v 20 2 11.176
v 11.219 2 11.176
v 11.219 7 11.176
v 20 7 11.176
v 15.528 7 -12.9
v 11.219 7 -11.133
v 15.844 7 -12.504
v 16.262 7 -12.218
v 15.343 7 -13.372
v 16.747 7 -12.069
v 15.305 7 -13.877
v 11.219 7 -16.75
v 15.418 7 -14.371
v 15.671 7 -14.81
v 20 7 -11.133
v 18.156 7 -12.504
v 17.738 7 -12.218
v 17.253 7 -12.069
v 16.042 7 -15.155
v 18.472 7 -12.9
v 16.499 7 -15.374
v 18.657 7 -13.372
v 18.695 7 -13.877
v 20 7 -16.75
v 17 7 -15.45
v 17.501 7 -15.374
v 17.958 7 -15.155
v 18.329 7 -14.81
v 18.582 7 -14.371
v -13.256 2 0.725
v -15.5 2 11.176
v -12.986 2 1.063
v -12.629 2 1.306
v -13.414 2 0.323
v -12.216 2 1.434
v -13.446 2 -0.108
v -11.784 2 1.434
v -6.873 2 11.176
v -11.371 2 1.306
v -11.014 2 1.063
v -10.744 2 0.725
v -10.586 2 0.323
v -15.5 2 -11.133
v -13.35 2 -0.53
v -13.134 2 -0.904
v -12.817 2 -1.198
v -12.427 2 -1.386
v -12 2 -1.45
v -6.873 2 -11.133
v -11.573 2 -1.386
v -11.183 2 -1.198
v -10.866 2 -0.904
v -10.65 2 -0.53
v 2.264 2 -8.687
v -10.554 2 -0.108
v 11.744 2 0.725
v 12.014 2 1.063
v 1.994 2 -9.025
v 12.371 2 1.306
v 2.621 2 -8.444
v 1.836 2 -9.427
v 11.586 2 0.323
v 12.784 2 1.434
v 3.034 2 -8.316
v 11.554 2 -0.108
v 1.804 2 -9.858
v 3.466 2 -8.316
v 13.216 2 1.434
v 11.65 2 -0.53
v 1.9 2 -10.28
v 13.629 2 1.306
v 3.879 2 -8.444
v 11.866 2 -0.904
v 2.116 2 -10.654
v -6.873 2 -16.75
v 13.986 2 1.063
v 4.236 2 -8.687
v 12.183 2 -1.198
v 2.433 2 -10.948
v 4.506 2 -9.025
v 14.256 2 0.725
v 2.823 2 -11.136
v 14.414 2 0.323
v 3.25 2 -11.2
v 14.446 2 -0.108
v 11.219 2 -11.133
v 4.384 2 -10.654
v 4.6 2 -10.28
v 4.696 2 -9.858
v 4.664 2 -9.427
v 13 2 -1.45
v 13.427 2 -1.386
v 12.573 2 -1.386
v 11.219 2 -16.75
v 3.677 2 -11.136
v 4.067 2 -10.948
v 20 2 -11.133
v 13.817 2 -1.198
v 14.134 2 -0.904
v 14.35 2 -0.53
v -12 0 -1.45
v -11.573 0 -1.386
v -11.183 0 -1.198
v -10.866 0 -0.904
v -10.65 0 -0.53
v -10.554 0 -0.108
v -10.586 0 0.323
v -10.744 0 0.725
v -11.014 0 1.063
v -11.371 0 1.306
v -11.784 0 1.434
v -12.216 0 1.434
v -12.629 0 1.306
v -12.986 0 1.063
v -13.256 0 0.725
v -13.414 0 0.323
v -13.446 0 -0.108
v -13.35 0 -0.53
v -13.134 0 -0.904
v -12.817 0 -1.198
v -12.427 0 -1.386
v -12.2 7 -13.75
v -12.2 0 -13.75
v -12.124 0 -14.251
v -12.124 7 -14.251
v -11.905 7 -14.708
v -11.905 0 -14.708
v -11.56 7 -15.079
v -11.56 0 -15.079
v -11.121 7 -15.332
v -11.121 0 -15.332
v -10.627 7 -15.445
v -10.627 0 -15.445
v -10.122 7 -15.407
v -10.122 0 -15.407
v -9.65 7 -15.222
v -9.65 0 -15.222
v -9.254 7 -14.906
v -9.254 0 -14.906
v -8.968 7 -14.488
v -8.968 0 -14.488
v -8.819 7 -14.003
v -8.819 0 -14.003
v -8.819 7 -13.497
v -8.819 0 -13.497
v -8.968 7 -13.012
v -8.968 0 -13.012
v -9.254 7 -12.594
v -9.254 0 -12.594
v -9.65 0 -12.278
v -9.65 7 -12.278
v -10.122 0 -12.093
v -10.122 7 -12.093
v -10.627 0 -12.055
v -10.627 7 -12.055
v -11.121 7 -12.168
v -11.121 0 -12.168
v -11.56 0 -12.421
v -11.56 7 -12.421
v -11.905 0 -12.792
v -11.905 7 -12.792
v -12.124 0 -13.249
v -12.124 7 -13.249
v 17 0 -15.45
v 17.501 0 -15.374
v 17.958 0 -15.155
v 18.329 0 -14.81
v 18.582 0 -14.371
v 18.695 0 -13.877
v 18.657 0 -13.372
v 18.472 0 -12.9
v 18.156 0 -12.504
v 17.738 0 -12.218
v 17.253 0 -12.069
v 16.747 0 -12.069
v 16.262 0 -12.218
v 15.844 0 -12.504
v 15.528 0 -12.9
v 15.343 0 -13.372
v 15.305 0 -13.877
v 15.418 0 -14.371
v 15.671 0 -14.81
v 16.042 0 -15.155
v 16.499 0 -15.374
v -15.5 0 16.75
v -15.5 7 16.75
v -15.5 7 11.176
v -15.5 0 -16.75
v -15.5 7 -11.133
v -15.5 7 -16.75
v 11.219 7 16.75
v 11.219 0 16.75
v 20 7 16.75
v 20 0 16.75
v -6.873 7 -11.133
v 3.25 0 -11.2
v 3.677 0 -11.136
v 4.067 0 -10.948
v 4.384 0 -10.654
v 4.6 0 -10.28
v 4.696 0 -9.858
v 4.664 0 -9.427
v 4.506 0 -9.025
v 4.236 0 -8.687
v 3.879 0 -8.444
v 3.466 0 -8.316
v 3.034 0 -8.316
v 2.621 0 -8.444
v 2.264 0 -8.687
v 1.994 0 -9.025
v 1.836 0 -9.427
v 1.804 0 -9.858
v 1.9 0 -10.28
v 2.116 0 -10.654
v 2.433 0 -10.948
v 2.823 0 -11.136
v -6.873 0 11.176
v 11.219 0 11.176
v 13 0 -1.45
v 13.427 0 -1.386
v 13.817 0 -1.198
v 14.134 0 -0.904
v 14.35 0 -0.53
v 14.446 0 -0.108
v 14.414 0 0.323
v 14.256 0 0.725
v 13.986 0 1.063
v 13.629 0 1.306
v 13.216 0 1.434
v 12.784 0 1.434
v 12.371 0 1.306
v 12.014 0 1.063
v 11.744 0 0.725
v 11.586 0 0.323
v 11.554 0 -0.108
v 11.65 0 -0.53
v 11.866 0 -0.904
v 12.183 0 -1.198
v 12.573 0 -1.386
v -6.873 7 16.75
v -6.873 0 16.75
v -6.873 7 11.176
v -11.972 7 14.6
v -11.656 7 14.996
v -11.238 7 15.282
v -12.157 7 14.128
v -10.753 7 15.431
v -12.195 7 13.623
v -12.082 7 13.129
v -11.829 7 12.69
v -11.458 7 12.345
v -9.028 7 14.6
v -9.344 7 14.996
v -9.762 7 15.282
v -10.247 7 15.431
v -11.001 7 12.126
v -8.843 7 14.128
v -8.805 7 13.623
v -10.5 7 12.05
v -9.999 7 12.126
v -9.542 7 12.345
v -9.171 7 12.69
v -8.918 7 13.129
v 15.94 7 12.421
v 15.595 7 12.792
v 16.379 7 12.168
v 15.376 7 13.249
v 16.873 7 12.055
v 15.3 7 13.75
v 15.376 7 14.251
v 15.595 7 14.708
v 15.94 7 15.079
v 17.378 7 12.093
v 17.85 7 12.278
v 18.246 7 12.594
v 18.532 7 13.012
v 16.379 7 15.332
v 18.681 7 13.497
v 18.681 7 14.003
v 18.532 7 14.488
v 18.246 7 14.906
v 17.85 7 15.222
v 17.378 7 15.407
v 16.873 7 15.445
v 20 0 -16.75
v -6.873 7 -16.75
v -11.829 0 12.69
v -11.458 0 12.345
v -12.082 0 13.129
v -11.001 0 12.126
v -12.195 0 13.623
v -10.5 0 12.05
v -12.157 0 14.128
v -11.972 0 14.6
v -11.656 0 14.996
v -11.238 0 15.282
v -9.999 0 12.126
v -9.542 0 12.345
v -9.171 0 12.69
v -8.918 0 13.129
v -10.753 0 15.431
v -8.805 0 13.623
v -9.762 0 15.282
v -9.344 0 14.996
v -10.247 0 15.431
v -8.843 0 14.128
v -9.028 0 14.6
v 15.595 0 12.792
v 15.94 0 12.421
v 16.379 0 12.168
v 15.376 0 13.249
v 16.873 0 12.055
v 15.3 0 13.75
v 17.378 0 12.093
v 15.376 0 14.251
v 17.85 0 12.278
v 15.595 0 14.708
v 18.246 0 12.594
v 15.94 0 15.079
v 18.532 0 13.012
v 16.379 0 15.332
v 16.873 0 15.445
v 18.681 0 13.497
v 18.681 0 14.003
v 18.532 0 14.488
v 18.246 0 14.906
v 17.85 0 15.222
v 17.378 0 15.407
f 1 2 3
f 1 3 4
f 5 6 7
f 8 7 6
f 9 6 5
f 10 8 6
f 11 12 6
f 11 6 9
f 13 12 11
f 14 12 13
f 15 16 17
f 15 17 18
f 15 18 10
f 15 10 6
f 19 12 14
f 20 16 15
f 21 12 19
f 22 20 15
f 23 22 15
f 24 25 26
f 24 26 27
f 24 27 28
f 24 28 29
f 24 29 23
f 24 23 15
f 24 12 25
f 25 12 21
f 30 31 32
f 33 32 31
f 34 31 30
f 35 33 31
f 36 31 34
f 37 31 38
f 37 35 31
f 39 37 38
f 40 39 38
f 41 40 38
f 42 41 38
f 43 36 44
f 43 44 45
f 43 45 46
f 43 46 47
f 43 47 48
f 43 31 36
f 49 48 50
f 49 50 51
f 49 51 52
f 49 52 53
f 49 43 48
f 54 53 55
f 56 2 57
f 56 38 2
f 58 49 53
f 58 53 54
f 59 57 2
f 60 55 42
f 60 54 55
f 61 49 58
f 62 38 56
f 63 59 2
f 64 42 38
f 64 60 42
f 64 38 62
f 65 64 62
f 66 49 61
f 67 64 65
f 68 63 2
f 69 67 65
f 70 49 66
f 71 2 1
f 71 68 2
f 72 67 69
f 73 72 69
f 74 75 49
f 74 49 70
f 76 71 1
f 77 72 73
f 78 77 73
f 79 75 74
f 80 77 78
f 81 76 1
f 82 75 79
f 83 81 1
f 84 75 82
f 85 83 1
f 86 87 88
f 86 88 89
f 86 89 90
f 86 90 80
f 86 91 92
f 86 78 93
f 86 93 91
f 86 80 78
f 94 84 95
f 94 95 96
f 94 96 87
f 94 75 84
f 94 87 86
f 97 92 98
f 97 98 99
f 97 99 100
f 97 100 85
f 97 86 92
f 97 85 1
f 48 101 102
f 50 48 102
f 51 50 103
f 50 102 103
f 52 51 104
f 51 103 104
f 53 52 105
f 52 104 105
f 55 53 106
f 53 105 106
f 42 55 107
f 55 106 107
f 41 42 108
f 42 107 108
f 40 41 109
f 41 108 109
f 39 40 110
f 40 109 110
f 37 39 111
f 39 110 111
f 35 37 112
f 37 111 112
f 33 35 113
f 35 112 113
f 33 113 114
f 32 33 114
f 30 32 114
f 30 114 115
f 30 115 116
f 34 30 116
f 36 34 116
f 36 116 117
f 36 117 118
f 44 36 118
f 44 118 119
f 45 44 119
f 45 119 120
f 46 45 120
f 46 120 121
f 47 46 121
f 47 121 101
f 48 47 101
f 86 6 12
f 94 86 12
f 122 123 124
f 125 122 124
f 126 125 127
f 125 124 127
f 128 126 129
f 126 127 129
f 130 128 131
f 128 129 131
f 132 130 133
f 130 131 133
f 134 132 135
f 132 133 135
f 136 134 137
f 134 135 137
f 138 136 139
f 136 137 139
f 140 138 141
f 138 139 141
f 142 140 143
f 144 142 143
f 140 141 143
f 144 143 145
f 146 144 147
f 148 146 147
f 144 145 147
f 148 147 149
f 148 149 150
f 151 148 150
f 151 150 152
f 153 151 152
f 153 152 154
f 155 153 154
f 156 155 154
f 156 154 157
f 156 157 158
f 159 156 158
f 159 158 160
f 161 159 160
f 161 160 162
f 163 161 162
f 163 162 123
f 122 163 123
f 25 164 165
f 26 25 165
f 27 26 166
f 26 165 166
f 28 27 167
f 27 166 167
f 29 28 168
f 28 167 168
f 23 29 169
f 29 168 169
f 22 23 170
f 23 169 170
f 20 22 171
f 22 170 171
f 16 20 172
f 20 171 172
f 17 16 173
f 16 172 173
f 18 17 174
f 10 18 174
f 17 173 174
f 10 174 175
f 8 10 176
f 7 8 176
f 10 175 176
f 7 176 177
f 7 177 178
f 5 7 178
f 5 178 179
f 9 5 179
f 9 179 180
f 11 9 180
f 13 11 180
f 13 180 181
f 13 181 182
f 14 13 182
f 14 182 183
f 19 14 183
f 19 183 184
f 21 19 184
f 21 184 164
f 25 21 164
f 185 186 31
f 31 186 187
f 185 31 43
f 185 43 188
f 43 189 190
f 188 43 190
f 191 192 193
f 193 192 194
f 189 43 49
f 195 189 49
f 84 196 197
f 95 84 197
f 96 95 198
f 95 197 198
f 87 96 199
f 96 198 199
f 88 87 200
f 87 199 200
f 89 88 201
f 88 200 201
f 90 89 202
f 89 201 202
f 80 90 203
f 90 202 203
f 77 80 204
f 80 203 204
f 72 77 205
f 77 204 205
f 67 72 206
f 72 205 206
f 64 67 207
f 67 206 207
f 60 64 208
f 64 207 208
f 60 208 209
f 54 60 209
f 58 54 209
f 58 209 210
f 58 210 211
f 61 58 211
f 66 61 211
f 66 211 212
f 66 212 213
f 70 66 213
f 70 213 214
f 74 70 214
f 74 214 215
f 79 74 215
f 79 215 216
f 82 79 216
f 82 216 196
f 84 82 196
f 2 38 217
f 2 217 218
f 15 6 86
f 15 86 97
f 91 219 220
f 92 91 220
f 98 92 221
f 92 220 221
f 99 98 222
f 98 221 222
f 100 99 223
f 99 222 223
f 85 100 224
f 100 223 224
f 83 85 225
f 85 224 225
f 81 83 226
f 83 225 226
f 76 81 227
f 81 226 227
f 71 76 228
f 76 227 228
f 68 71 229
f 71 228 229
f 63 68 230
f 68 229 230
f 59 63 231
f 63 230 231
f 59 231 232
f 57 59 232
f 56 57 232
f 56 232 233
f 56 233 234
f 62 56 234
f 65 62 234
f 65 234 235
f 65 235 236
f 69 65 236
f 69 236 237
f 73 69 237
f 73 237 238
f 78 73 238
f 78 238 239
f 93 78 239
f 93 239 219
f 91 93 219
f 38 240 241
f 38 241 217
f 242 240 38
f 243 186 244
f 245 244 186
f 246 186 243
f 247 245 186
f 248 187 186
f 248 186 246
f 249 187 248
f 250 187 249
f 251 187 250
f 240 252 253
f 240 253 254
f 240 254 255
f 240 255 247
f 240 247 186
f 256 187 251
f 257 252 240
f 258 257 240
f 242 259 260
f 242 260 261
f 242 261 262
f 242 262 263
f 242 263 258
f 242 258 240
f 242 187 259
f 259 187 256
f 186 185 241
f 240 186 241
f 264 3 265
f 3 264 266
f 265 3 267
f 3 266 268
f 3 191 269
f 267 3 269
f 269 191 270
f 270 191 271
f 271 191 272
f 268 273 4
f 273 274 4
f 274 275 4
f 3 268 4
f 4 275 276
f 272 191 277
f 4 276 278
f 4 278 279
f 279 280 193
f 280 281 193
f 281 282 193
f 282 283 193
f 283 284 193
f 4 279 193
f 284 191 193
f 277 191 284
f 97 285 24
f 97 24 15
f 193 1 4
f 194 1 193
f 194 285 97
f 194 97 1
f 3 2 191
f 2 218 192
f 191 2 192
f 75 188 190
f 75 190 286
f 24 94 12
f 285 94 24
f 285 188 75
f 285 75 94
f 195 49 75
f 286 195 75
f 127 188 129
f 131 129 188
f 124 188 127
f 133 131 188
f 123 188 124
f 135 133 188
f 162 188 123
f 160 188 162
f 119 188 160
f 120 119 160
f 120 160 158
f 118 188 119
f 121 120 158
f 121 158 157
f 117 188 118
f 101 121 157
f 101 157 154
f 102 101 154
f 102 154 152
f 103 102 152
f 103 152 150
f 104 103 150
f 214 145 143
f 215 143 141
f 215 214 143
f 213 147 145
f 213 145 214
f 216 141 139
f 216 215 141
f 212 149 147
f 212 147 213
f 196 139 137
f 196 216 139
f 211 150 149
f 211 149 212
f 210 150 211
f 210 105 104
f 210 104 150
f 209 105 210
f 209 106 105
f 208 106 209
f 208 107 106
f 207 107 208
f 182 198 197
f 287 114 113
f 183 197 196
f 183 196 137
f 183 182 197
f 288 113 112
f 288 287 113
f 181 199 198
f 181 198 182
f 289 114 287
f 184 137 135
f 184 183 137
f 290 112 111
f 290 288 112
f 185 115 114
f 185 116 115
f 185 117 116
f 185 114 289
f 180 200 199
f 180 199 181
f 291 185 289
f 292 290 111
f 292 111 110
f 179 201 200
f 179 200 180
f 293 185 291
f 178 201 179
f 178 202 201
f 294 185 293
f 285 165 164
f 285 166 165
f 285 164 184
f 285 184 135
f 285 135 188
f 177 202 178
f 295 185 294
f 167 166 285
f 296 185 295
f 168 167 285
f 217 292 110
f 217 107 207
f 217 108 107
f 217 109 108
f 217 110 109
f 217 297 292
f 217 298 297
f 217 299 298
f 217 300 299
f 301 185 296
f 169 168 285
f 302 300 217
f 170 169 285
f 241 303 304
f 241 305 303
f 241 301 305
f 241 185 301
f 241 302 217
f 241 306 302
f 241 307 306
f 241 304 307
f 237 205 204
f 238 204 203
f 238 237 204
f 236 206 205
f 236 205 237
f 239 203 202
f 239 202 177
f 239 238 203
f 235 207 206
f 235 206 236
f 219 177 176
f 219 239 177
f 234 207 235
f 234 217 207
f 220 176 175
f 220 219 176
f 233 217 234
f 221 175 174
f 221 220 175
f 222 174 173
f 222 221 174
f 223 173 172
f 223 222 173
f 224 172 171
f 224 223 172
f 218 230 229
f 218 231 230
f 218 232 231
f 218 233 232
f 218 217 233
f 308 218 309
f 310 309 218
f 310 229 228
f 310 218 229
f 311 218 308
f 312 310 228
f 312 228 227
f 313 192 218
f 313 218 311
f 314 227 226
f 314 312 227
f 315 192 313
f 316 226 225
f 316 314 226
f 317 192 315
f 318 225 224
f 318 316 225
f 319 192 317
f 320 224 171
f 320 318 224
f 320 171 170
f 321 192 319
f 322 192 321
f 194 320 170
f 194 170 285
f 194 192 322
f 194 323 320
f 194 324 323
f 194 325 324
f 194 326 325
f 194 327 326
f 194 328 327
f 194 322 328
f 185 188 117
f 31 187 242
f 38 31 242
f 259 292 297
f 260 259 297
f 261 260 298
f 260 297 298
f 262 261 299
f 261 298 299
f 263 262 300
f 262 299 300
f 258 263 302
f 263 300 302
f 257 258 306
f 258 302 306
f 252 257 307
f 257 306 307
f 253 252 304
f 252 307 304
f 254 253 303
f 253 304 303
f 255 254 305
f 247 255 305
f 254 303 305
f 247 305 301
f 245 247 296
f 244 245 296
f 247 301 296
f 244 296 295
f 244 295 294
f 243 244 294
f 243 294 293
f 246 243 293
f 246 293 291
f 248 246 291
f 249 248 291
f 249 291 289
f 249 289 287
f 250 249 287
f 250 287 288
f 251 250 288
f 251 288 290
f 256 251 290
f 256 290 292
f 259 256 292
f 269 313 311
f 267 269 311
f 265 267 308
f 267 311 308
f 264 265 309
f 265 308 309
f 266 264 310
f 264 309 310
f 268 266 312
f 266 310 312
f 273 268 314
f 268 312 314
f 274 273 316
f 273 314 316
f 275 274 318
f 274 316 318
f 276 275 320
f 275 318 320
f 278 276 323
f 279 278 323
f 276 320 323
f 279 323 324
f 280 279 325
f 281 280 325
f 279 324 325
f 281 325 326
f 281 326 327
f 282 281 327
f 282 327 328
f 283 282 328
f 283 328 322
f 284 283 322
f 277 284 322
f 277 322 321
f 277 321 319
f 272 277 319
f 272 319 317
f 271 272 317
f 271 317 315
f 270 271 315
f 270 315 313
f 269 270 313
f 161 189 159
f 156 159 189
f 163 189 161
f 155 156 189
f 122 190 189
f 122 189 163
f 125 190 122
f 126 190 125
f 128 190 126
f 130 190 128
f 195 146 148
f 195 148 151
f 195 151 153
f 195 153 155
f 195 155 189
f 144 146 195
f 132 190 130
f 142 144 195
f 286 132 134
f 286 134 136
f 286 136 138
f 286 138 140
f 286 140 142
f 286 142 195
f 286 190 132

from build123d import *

# Parameters (mm, degrees)
SKETCH1_W              = 40
SKETCH1_H              = 33.5
BOSS_EXTRUDE1_DEPTH    = 7
M3_CLEARANCE_HOLE1_D   = 3.4
SKETCH4_W              = 31.219256934
SKETCH4_H              = 27.926271275
CUT_EXTRUDE1_DEPTH     = 5
SKETCH5_W              = 8.780743066
SKETCH5_H              = 22.309556891
CUT_EXTRUDE2_DEPTH     = 5
M2_5_CLEARANCE_HOLE2_D = 2.9
SKETCH12_W             = 26.872555909
SKETCH12_H             = 5.573728725
CUT_EXTRUDE4_DEPTH     = 8
SKETCH13_W             = 8.780743066
SKETCH13_H             = 5.573728725
BOSS_EXTRUDE2_DEPTH    = 7
SKETCH14_W             = 13.127444091
SKETCH14_H             = 5.616714384
BOSS_EXTRUDE3_DEPTH    = 5
M3_CLEARANCE_HOLE2_D   = 3.4
SKETCH17_W             = 4.5
SKETCH17_H             = 33.5
CUT_EXTRUDE5_DEPTH     = 8


with BuildPart() as part:
    # Sketch1 → Boss-Extrude1 (new body)
    with BuildSketch(Plane(origin=(0, 0, 0), x_dir=(1, 0, 0), z_dir=(0, 1, 0))):
        Rectangle(SKETCH1_W, SKETCH1_H)
    extrude(amount=BOSS_EXTRUDE1_DEPTH)

    # M3 Clearance Hole1 (through all)
    with Locations(Plane(origin=(-10.5, 7, 13.75), x_dir=(0, 0, 1), z_dir=(0, 1, 0))):
        with Locations((0, 0), (-27.5, 27.5)):
            Hole(M3_CLEARANCE_HOLE1_D / 2)

    # Sketch4 → Cut-Extrude1 (cut)
    with BuildSketch(Plane(origin=(0, 7, 0), x_dir=(1, 0, 0), z_dir=(0, 1, 0))):
        with Locations((-4.390371533, 2.786864362)):
            Rectangle(SKETCH4_W, SKETCH4_H)
    extrude(amount=-CUT_EXTRUDE1_DEPTH, mode=Mode.SUBTRACT)

    # Sketch5 → Cut-Extrude2 (cut)
    with BuildSketch(Plane(origin=(0, 7, 0), x_dir=(1, 0, 0), z_dir=(0, 1, 0))):
        with Locations((15.609628467, -0.02149283)):
            Rectangle(SKETCH5_W, SKETCH5_H)
    extrude(amount=-CUT_EXTRUDE2_DEPTH, mode=Mode.SUBTRACT)

    # M2.5 Clearance Hole2 (through all)
    with Locations(Plane(origin=(-12, 2, 0), x_dir=(0, 0, 1), z_dir=(0, 1, 0))):
        with Locations((0, 0), (0, 25), (-9.75, 15.25)):
            Hole(M2_5_CLEARANCE_HOLE2_D / 2)

    # Sketch12 → Cut-Extrude4 (cut, through all)
    with BuildSketch(Plane(origin=(0, 7, 0), x_dir=(1, 0, 0), z_dir=(0, 1, 0))):
        with Locations((6.563722045, -13.963135638)):
            Rectangle(SKETCH12_W, SKETCH12_H)
    extrude(amount=-CUT_EXTRUDE4_DEPTH, mode=Mode.SUBTRACT)

    # Sketch13 → Boss-Extrude2 (add)
    with BuildSketch(Plane.XZ):
        with Locations((15.609628467, 13.963135638)):
            Rectangle(SKETCH13_W, SKETCH13_H)
    extrude(amount=-BOSS_EXTRUDE2_DEPTH)

    # Sketch14 → Boss-Extrude3 (add)
    with BuildSketch(Plane(origin=(0, 2, 0), x_dir=(1, 0, 0), z_dir=(0, 1, 0))):
        with Locations((-13.436277954, 13.941642808)):
            Rectangle(SKETCH14_W, SKETCH14_H)
    extrude(amount=BOSS_EXTRUDE3_DEPTH)

    # M3 Clearance Hole2 (through all)
    with Locations(Plane(origin=(0, 7, 0), x_dir=(1, 0, 0), z_dir=(0, 1, 0))):
        with Locations((-10.5, 13.75), (17, -13.75)):
            Hole(M3_CLEARANCE_HOLE2_D / 2)

    # Sketch17 → Cut-Extrude5 (cut, through all)
    with BuildSketch(Plane(origin=(0, 7, 0), x_dir=(1, 0, 0), z_dir=(0, 1, 0))):
        with Locations((-17.75, 0)):
            Rectangle(SKETCH17_W, SKETCH17_H)
    extrude(amount=-CUT_EXTRUDE5_DEPTH, mode=Mode.SUBTRACT)


solid = part.part
